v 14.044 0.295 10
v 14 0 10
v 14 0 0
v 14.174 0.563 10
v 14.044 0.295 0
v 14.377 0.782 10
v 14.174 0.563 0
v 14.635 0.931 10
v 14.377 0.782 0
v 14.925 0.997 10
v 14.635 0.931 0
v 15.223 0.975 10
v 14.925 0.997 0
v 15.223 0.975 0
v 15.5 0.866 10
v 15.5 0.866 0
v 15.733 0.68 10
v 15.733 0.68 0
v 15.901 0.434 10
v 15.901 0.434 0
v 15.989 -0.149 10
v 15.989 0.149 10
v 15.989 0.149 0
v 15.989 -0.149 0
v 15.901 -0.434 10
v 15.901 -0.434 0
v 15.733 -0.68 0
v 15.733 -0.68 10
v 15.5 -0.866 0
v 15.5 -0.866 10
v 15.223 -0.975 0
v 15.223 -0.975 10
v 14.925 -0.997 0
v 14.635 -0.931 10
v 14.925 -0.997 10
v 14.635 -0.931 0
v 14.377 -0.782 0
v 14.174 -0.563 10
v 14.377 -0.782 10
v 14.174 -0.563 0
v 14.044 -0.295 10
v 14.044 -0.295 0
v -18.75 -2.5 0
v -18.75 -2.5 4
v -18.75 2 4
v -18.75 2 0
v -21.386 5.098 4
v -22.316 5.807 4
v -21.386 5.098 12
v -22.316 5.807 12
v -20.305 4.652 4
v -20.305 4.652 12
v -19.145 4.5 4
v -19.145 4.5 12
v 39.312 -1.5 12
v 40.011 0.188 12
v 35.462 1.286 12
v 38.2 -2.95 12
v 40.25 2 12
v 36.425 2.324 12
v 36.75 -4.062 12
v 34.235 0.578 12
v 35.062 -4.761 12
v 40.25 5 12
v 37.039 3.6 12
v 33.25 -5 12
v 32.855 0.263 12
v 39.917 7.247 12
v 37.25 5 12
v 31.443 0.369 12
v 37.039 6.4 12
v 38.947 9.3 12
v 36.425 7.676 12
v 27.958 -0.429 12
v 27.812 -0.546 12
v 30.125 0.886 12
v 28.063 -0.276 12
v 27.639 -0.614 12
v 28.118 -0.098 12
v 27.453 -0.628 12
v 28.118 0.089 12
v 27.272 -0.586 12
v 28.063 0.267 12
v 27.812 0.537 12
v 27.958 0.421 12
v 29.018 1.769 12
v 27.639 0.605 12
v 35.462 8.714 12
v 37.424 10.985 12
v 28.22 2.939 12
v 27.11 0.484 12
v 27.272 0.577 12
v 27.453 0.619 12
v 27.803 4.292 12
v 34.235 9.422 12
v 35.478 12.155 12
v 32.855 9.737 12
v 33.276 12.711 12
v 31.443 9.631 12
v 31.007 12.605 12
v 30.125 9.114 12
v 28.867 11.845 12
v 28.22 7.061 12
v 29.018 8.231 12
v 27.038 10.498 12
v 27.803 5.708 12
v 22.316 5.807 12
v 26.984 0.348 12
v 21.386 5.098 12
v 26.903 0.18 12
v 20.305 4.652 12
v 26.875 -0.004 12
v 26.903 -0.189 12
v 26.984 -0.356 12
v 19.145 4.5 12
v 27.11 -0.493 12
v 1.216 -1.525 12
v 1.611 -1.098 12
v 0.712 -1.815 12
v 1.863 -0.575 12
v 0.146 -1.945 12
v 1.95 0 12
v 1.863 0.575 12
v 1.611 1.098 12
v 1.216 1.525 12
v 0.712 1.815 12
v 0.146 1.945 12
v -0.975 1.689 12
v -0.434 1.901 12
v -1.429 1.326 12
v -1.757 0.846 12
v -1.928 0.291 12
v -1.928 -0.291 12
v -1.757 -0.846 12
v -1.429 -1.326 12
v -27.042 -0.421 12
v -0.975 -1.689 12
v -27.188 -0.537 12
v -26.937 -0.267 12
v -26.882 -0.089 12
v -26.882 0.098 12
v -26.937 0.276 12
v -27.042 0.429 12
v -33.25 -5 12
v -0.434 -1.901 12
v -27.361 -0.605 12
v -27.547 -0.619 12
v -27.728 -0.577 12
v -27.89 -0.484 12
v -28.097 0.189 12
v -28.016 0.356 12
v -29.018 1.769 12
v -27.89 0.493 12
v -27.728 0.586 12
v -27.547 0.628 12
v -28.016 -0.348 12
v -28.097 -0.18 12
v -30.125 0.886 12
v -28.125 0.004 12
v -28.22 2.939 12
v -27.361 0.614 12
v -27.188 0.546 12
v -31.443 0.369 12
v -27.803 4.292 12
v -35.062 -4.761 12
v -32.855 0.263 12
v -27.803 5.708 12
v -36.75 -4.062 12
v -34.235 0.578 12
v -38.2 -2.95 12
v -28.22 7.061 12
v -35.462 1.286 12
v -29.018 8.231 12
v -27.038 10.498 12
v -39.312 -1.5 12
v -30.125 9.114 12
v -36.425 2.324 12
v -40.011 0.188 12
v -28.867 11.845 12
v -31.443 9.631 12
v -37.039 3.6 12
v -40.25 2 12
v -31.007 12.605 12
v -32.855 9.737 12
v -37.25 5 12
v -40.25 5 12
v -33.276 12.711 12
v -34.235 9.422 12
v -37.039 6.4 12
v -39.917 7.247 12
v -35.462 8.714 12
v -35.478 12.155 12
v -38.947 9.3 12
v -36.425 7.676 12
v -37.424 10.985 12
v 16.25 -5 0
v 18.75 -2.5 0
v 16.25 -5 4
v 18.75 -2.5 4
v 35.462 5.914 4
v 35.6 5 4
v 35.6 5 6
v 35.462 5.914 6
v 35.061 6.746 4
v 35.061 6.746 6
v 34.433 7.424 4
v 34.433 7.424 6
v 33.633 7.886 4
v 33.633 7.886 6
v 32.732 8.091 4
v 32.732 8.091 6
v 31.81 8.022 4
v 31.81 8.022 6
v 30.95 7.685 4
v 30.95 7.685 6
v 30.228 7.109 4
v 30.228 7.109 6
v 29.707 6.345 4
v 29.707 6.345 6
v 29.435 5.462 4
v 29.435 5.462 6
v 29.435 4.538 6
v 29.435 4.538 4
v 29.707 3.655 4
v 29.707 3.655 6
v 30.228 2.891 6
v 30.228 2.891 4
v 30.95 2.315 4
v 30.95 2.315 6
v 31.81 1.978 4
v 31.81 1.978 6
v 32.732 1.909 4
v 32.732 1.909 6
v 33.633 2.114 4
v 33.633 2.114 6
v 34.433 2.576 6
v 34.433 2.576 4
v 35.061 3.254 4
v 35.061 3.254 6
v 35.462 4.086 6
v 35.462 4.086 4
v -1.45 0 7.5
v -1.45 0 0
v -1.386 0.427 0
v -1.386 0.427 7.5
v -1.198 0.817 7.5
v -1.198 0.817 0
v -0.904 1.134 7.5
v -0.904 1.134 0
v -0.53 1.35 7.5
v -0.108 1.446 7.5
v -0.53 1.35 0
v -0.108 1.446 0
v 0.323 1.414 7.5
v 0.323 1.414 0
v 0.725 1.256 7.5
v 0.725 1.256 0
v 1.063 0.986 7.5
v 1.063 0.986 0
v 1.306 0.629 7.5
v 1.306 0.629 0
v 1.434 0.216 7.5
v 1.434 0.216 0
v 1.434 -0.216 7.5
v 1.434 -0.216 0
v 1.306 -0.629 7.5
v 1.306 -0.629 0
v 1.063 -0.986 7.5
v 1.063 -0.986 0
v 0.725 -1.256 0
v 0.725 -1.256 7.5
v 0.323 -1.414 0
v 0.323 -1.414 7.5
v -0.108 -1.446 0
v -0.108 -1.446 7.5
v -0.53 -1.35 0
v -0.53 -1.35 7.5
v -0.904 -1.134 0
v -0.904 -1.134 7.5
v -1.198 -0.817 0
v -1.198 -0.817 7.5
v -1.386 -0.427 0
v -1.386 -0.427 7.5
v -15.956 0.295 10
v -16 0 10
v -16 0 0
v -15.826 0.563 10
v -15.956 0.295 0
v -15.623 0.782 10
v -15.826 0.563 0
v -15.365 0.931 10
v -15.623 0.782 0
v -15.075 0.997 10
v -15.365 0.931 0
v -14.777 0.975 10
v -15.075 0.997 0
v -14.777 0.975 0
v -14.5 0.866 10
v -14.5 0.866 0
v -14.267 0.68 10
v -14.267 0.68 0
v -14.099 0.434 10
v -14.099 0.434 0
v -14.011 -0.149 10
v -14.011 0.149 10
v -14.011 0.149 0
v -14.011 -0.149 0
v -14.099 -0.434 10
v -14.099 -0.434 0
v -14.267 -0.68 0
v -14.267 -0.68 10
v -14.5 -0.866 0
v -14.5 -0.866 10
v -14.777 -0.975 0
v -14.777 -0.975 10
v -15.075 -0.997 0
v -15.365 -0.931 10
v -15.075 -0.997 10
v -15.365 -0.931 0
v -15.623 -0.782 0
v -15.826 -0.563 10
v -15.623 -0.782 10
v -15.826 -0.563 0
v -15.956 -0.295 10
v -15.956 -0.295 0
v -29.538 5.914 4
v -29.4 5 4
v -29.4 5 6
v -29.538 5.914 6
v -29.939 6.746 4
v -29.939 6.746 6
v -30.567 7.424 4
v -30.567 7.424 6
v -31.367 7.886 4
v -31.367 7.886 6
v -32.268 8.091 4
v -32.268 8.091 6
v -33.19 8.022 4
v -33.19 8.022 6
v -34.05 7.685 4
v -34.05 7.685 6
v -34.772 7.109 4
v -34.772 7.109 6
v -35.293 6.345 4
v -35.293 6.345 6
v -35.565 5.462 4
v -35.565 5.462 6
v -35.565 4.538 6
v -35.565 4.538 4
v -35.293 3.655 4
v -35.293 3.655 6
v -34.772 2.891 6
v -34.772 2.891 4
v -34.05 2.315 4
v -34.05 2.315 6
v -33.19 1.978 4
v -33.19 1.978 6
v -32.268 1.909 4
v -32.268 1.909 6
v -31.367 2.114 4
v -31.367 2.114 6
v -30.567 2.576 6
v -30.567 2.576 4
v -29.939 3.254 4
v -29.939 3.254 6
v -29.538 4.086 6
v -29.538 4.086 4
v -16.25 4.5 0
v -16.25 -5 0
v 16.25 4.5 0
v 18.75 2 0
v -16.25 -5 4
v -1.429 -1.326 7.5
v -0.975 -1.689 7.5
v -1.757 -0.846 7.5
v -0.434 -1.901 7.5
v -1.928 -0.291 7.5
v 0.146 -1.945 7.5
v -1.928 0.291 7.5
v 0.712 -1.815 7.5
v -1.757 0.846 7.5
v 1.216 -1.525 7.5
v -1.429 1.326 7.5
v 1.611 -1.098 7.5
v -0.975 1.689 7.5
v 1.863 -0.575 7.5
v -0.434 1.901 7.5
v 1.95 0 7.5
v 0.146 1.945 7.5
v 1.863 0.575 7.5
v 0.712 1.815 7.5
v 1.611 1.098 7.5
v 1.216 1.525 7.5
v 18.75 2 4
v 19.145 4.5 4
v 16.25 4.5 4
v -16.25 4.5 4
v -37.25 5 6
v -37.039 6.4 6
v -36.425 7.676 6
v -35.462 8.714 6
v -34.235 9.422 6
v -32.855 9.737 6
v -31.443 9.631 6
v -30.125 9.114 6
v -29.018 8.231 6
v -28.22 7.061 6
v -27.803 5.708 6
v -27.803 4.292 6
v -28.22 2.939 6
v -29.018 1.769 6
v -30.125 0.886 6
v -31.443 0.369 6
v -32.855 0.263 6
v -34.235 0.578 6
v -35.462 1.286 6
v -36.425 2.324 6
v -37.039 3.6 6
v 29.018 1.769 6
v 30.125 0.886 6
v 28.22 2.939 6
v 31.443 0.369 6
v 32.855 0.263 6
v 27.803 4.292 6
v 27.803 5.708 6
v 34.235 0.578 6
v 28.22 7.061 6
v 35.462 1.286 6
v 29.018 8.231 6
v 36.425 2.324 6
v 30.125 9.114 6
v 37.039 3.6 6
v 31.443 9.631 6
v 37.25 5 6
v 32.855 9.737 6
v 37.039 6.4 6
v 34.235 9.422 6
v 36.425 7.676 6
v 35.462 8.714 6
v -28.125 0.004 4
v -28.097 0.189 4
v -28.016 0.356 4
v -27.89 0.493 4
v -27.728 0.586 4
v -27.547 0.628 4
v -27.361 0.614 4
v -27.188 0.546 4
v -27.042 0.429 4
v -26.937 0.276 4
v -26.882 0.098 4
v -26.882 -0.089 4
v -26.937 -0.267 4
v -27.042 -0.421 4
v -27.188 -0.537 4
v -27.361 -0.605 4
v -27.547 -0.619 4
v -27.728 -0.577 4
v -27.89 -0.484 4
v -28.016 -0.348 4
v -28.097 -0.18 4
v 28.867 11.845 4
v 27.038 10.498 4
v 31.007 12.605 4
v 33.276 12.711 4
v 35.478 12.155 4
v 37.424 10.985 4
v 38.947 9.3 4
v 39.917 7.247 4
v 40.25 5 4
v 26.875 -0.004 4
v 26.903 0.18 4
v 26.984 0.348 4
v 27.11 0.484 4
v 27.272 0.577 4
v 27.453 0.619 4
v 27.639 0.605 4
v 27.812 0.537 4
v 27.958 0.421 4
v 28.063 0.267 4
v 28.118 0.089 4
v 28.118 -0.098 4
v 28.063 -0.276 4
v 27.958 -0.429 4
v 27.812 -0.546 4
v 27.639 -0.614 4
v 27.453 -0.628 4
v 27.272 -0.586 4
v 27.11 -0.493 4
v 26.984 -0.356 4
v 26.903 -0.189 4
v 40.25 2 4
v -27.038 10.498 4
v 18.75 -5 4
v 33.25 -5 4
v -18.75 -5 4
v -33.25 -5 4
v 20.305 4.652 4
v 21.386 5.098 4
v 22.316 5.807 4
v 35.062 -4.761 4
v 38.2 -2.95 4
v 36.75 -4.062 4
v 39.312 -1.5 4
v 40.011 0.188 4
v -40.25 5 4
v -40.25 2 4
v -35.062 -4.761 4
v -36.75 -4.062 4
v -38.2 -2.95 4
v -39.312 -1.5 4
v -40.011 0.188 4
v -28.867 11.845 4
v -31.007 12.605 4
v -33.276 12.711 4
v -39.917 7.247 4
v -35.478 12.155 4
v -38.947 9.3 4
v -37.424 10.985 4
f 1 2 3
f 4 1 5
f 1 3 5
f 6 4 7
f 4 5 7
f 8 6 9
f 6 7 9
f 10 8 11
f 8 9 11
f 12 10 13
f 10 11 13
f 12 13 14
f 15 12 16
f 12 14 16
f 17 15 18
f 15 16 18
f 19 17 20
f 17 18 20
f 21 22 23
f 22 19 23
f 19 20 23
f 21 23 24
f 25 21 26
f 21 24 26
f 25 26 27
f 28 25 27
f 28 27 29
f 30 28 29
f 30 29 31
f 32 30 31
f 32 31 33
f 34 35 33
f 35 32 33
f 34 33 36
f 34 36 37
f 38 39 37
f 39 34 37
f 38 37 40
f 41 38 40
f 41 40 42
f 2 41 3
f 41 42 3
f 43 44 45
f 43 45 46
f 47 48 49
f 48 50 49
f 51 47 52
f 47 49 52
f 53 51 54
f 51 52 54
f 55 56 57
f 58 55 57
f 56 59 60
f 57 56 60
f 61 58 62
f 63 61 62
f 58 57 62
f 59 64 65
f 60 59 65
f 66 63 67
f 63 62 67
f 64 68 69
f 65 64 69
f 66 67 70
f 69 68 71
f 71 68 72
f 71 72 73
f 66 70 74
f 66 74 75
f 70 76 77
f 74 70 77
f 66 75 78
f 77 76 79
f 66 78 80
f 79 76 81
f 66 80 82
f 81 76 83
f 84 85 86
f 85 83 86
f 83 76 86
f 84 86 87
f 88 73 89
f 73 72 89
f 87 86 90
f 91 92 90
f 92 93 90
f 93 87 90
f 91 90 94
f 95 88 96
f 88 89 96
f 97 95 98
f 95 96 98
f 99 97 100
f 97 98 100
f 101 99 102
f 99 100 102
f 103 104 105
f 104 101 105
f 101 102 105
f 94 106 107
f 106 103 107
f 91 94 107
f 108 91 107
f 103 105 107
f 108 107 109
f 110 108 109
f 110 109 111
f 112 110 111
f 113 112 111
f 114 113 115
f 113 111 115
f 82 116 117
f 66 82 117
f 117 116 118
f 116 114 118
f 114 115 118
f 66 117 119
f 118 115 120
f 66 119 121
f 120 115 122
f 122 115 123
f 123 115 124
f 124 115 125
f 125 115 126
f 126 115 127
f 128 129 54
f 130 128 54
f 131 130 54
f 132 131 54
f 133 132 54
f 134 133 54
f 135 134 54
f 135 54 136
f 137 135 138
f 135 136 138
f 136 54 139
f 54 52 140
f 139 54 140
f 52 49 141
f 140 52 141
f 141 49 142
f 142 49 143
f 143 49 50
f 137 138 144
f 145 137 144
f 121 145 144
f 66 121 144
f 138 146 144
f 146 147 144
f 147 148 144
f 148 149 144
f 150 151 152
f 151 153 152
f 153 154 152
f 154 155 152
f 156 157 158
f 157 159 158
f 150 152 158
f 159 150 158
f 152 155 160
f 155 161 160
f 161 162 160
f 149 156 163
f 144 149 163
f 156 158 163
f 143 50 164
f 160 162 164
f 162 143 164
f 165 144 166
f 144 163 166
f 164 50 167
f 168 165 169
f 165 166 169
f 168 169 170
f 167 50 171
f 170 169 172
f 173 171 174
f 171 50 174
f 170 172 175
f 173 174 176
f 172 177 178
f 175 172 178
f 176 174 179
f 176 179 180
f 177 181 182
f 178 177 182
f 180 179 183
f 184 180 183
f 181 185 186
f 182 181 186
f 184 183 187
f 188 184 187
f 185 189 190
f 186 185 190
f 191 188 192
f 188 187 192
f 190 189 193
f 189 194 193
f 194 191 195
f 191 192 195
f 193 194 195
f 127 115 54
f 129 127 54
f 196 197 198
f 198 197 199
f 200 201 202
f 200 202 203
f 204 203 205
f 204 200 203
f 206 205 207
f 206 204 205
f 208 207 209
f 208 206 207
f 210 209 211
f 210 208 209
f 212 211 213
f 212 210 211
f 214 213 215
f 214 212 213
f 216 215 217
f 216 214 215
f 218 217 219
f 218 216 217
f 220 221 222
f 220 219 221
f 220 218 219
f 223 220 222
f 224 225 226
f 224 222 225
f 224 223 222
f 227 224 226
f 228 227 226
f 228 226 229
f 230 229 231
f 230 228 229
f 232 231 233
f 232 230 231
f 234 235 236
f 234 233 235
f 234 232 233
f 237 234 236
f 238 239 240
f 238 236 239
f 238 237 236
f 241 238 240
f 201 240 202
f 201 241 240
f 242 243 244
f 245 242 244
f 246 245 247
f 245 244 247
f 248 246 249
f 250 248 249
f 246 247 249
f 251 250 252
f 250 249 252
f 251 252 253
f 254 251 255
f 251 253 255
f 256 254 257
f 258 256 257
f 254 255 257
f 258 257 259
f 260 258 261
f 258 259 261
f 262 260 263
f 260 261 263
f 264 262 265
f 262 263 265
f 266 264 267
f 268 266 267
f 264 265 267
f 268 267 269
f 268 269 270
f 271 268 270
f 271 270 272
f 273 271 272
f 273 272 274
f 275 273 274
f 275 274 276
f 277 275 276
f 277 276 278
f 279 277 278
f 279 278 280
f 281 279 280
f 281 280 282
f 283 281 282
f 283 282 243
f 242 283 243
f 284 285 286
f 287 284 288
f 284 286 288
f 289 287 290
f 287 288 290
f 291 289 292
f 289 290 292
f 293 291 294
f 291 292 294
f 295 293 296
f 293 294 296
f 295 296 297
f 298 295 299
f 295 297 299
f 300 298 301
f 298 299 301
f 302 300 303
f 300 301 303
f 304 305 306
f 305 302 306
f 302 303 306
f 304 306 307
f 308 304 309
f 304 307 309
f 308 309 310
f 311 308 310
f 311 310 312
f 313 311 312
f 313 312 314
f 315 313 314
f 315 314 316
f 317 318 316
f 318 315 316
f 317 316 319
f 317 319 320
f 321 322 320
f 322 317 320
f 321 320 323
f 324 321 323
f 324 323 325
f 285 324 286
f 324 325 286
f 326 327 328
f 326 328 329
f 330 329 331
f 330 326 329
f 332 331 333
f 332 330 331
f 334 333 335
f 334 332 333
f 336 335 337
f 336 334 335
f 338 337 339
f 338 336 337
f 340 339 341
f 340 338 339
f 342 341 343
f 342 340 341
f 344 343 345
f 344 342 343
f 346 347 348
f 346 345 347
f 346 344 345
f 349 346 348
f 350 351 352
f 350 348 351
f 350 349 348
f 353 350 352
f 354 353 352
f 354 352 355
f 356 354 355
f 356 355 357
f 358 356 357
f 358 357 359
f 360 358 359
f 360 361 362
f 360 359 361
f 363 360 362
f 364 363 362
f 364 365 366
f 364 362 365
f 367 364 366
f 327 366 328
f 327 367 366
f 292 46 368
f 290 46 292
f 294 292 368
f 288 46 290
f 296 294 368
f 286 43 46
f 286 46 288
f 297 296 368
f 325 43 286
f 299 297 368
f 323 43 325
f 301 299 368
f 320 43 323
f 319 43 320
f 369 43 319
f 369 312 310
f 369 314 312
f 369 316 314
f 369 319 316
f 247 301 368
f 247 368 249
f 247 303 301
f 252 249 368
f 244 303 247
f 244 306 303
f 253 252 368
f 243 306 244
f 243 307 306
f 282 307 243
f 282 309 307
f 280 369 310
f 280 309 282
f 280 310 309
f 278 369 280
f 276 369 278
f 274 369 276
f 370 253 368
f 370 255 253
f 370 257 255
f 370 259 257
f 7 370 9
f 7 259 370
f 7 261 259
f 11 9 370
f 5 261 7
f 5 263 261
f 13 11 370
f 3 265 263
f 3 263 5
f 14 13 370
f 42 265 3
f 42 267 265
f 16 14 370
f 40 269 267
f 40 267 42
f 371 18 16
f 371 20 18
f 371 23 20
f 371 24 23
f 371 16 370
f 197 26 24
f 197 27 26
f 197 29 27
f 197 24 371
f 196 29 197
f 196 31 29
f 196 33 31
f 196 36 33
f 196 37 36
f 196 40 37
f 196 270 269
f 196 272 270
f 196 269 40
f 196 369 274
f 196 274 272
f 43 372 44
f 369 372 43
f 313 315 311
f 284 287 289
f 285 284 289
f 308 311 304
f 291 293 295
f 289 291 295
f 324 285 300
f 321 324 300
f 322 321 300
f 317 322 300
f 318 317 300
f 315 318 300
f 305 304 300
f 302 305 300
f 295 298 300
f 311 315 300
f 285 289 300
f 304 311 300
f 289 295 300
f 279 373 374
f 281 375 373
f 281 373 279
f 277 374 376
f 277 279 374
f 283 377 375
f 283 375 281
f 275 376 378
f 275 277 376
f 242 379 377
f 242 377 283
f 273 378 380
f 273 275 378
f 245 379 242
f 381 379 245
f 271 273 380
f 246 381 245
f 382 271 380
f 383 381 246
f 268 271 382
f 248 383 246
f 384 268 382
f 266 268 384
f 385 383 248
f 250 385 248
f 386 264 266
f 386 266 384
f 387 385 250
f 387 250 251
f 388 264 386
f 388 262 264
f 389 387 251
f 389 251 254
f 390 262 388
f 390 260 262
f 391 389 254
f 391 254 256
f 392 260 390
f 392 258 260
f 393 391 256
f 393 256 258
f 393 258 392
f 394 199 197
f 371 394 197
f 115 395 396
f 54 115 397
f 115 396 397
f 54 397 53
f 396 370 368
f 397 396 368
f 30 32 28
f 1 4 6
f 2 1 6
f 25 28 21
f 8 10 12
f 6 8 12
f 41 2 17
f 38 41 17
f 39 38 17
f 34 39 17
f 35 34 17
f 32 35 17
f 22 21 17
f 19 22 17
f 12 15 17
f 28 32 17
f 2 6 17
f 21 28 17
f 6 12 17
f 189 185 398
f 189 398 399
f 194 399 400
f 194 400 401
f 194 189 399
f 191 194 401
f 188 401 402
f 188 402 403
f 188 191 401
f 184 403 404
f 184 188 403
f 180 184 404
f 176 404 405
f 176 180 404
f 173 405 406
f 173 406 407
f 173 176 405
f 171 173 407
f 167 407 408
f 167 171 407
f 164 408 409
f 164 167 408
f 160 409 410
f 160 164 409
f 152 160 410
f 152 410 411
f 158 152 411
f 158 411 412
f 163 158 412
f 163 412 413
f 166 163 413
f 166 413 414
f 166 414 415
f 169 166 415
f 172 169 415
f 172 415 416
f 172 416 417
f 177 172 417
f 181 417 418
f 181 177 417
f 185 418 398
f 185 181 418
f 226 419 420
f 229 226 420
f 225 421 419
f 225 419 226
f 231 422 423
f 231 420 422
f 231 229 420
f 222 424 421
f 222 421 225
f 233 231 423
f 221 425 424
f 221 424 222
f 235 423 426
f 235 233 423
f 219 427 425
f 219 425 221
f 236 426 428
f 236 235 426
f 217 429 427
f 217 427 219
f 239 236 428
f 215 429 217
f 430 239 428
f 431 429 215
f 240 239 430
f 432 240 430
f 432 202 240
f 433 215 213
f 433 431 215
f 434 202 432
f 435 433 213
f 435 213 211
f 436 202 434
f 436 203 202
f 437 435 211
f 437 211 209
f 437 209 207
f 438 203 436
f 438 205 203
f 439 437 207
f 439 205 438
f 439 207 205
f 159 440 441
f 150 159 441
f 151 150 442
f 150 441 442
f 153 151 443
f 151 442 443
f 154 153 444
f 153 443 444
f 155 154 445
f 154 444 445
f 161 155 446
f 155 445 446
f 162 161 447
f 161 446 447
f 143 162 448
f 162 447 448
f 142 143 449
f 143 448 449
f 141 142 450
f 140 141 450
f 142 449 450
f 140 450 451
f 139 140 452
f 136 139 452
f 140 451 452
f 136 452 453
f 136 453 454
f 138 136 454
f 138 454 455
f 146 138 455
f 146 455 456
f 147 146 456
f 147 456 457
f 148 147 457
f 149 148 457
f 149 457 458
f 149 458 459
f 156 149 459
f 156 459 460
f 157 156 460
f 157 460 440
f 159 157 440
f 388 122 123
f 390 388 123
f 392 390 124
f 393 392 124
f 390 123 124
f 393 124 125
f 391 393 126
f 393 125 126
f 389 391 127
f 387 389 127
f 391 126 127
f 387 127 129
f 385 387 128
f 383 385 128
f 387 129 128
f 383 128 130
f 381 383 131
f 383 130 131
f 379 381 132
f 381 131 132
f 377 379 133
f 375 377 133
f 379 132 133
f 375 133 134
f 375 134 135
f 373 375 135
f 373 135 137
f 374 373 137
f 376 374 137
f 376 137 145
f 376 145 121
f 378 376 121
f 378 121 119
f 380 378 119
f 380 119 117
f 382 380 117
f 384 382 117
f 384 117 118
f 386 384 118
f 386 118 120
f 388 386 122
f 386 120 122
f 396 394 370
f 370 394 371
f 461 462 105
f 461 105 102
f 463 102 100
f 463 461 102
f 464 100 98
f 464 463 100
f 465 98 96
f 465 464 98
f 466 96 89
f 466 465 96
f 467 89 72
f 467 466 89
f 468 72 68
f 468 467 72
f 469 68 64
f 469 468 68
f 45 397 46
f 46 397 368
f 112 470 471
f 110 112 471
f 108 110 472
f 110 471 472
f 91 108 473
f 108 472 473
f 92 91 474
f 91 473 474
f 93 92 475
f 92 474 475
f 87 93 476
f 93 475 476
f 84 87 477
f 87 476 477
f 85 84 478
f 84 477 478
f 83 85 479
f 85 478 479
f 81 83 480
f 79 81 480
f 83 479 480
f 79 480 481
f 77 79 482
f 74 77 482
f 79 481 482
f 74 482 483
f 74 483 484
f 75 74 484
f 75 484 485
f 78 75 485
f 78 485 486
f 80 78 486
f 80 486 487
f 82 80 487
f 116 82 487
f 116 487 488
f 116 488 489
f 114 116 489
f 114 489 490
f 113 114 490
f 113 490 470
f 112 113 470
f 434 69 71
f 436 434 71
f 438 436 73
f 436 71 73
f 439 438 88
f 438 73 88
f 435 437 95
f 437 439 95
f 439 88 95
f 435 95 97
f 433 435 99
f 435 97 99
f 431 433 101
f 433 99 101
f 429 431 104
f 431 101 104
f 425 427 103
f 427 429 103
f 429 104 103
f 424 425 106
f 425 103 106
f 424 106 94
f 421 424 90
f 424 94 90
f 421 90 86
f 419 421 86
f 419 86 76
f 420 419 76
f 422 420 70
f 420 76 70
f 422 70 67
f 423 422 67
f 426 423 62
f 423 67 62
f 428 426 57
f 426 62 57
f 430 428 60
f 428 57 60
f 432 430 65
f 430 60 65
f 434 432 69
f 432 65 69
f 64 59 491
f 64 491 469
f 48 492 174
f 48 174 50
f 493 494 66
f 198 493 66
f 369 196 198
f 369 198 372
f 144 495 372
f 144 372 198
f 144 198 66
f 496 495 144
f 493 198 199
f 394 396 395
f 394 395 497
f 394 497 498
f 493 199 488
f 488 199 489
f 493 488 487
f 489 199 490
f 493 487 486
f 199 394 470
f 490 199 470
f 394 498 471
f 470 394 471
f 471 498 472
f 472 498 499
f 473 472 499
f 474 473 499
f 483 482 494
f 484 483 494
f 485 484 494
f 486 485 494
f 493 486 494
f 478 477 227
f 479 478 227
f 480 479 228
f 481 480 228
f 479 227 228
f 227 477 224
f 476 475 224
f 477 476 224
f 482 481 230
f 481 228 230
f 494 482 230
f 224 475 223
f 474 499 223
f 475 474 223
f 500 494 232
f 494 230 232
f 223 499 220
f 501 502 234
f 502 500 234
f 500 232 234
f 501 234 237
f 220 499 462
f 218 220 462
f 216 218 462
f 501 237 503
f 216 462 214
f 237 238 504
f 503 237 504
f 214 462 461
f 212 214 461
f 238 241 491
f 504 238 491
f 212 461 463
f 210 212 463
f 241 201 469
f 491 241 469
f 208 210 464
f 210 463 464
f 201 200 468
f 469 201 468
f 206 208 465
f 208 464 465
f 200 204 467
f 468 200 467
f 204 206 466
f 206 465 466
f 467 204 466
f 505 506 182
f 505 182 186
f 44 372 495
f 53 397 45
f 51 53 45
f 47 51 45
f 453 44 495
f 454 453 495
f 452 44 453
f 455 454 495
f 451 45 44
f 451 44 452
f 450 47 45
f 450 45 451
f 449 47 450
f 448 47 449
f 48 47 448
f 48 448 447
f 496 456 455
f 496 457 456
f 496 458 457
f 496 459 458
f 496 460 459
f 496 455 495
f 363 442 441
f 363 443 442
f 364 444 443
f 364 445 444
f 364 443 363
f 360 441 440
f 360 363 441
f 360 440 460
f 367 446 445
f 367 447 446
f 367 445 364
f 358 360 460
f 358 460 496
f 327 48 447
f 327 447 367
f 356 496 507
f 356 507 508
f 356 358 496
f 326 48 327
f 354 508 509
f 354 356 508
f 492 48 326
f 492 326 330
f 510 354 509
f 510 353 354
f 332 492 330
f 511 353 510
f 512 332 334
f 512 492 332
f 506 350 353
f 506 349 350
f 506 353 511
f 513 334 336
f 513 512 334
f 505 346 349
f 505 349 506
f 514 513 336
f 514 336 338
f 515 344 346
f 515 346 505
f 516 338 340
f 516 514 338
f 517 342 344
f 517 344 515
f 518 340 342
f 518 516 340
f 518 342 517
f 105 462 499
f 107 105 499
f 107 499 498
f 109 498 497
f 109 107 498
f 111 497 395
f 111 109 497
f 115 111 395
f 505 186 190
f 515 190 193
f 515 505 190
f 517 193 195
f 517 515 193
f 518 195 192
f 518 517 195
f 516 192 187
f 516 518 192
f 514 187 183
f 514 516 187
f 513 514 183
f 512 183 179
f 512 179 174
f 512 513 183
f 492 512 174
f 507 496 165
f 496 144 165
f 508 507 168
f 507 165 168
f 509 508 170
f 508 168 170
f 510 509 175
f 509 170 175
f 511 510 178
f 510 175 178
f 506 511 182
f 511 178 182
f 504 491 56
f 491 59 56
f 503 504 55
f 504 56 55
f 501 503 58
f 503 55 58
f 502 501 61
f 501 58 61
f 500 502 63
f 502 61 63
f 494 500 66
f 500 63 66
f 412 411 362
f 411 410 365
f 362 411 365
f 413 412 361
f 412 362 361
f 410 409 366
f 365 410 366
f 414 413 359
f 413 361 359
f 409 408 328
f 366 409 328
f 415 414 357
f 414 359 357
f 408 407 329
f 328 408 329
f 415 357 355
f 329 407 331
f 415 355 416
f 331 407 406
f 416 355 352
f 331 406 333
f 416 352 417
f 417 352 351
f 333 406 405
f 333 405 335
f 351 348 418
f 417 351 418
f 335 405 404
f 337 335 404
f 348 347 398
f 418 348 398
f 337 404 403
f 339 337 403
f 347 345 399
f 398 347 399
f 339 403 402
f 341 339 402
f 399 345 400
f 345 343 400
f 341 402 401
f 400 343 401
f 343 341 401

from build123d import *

# Parameters (mm, degrees)
SKETCH1_W                     = 78.5
SKETCH1_H                     = 7
BOSS_EXTRUDE1_DEPTH           = 12
BOSS_EXTRUDE1_DEPTH_BACK      = 12
SKETCH2_W                     = 20.5
SKETCH2_H                     = 6.3
CUT_EXTRUDE1_DEPTH            = 8
SKETCH3_W                     = 13.5
SKETCH3_H                     = 8.85
BOSS_EXTRUDE2_DEPTH           = 8
SKETCH4_R                     = 3.1
CUT_EXTRUDE2_DEPTH            = 22
CUT_EXTRUDE2_DEPTH_BACK       = 24.5
CUT_EXTRUDE3_DEPTH            = 5
SKETCH6_R                     = 6.2
CUT_EXTRUDE4_DEPTH            = 1
MIRROR2_COPY_1_SKETCH_R       = 6.2
MIRROR2_COPY_1_DEPTH          = 1
SKETCH7_W                     = 13.5
SKETCH7_H                     = 8.5
CUT_EXTRUDE5_DEPTH            = 1
MIRROR5_COPY_1_SKETCH_W       = 13.5
MIRROR5_COPY_1_SKETCH_H       = 8.5
MIRROR5_COPY_1_DEPTH          = 1
TAP_DRILL_FOR_M2_TAP1_D       = 1.6
CUT_EXTRUDE6_DEPTH            = 27
SKETCH12_W                    = 91.032241704
SKETCH12_H                    = 44.33734078
CUT_EXTRUDE7_DEPTH            = 22
F_2_0_2_DIAMETER_HOLE2_D      = 2
F_2_0_2_DIAMETER_HOLE2_DEPTH  = 16
F_2_0_2_DIAMETER_HOLE2_TIP    = 0.600860619
F_2_0_2_DIAMETER_HOLE1_D      = 2
F_2_0_2_DIAMETER_HOLE1_DEPTH  = 16
F_2_0_2_DIAMETER_HOLE1_TIP    = 0.600860619
ESQUISSE5_R                   = 3.1
BOSS_EXTRU_1_DEPTH            = 1
ESQUISSE6_R                   = 4.75
ENL_V_MAT_EXTRU_1_DEPTH       = 6
ESQUISSE7_R                   = 0.8
BOSS_EXTRU_2_DEPTH            = 8.85
BOSS_EXTRUDE3_DEPTH           = 1.5
SKETCH24_W                    = 22.483380367
SKETCH24_H                    = 20.071516443
CUT_EXTRUDE8_DEPTH            = 0.85
BOSS_EXTRUDE4_DEPTH           = 8
M2_5_CLEARANCE_HOLE1_D        = 2.9
M2_5_CLEARANCE_HOLE1_DEPTH    = 24
M2_5_CLEARANCE_HOLE1_TIP      = 0.871247898
SKETCH26_W                    = 37.5
SKETCH26_H                    = 12
BOSS_EXTRUDE6_DEPTH           = 1
SKETCH27_R                    = 1.95
CUT_EXTRUDE9_DEPTH            = 4.5
CHAMFER2_SIZE                 = 2.5
CUT_EXTRUDE10_DEPTH           = 10
ESQUISSE9_R                   = 0.6
ENL_V_MAT_EXTRU_2_DEPTH       = 13
SKETCH33_R                    = 7.75
SKETCH33_R_2                  = 4.75
BOSS_EXTRUDE9_DEPTH           = 8
SKETCH35_R                    = 1
BOSS_EXTRUDE10_DEPTH          = 2
BOSS_EXTRUDE11_DEPTH          = 8
FILLET2_R                     = 4.5
TAP_DRILL_FOR_M1_6_TAP1_D     = 1.25
TAP_DRILL_FOR_M1_6_TAP1_DEPTH = 24
TAP_DRILL_FOR_M1_6_TAP1_TIP   = 0.375537887
SKETCH40_W                    = 1
SKETCH40_H                    = 10
BOSS_EXTRUDE12_DEPTH          = 8
FILLET3_R                     = 7
SKETCH41_R                    = 0.582442918
BOSS_EXTRUDE13_DEPTH          = 8


with BuildPart() as part:
    # Sketch1 → Boss-Extrude1 (new body, two sides)
    with BuildSketch(Plane.XY) as boss_extrude1_sk:
        Rectangle(SKETCH1_W, SKETCH1_H)
    extrude(amount=BOSS_EXTRUDE1_DEPTH)
    extrude(boss_extrude1_sk.sketch, amount=-BOSS_EXTRUDE1_DEPTH_BACK)

    # Sketch2 → Cut-Extrude1 (cut, through all)
    with BuildSketch(Plane(origin=(0, 3.5, 0), x_dir=(1, 0, 0), z_dir=(0, 1, 0))):
        with Locations((-29, 0)):
            Rectangle(SKETCH2_W, SKETCH2_H)
        with Locations((29, 0)):
            Rectangle(SKETCH2_W, SKETCH2_H)
    extrude(amount=-CUT_EXTRUDE1_DEPTH, mode=Mode.SUBTRACT)

    # Sketch3 → Boss-Extrude2 (add)
    with BuildSketch(Plane(origin=(0, 3.5, 0), x_dir=(1, 0, 0), z_dir=(0, 1, 0))):
        with Locations((-32.5, 7.575)):
            Rectangle(SKETCH3_W, SKETCH3_H)
        with Locations((-32.5, -7.575)):
            Rectangle(SKETCH3_W, SKETCH3_H)
        with Locations((32.5, -7.575)):
            Rectangle(SKETCH3_W, SKETCH3_H)
        with Locations((32.5, 7.575)):
            Rectangle(SKETCH3_W, SKETCH3_H)
    extrude(amount=BOSS_EXTRUDE2_DEPTH)

    # Sketch4 → Cut-Extrude2 (cut, two sides)
    with BuildSketch(Plane.XY) as cut_extrude2_sk:
        with Locations((-32.5, 5)):
            Circle(SKETCH4_R)
        with Locations((32.5, 5)):
            Circle(SKETCH4_R)
    extrude(amount=CUT_EXTRUDE2_DEPTH, mode=Mode.SUBTRACT)
    extrude(cut_extrude2_sk.sketch, amount=-CUT_EXTRUDE2_DEPTH_BACK, mode=Mode.SUBTRACT)

    # Sketch5 → Cut-Extrude3 (cut)
    with BuildSketch(Plane.XY):
        Polygon((15, 3.5), (36.256888292, -2.195766051), (36.256888292, 11.5), (15, 11.5), align=None)
    extrude(amount=-CUT_EXTRUDE3_DEPTH, mode=Mode.SUBTRACT)

    # Sketch6 → Cut-Extrude4 (cut)
    with BuildSketch(Plane.XY.offset(12)):
        with Locations((32.5, 5)):
            Circle(SKETCH6_R)
    cut_extrude4 = extrude(amount=-CUT_EXTRUDE4_DEPTH, mode=Mode.SUBTRACT)

    # Mirror1: Cut-Extrude4 across plane
    add(cut_extrude4.mirror(Plane.XY), mode=Mode.SUBTRACT)

    # Mirror2: Cut-Extrude4 across plane
    add(cut_extrude4.mirror(Plane(origin=(0, 0, 0), x_dir=(0, 0, 1), z_dir=(1, 0, 0))), mode=Mode.SUBTRACT)

    # Mirror2 copy 1 sketch → Mirror2 copy 1 (cut)
    with BuildSketch(Plane(origin=(0, 0, -12), x_dir=(-1, 0, 0), z_dir=(0, 0, -1))):
        with Locations((32.5, 5)):
            Circle(MIRROR2_COPY_1_SKETCH_R)
    extrude(amount=-MIRROR2_COPY_1_DEPTH, mode=Mode.SUBTRACT)

    # Sketch7 → Cut-Extrude5 (cut)
    with BuildSketch(Plane.XY.offset(12)):
        with Locations((-32.5, 7.25)):
            Rectangle(SKETCH7_W, SKETCH7_H)
    cut_extrude5 = extrude(amount=-CUT_EXTRUDE5_DEPTH, mode=Mode.SUBTRACT)

    # Mirror3: Cut-Extrude5 across plane
    add(cut_extrude5.mirror(Plane(origin=(0, 0, 0), x_dir=(0, 0, 1), z_dir=(1, 0, 0))), mode=Mode.SUBTRACT)

    # Mirror5: Cut-Extrude5 across plane
    add(cut_extrude5.mirror(Plane.XY), mode=Mode.SUBTRACT)

    # Mirror5 copy 1 sketch → Mirror5 copy 1 (cut)
    with BuildSketch(Plane(origin=(0, 0, -12), x_dir=(-1, 0, 0), z_dir=(0, 0, -1))):
        with Locations((-32.5, 7.25)):
            Rectangle(MIRROR5_COPY_1_SKETCH_W, MIRROR5_COPY_1_SKETCH_H)
    extrude(amount=-MIRROR5_COPY_1_DEPTH, mode=Mode.SUBTRACT)

    # Tap Drill for M2 Tap1 (through all)
    with Locations(Plane.XY.offset(12)):
        with Locations((-25, 0), (0, 0), (25, 0)):
            Hole(TAP_DRILL_FOR_M2_TAP1_D / 2)

    # Sketch11 → Cut-Extrude6 (cut)
    with BuildSketch(Plane.XY.offset(12)):
        with BuildLine():
            Line((-39.25, 5), (-39.25, 21.221242017))
            Line((-39.25, 21.221242017), (-25.75, 21.221242017))
            Line((-25.75, 21.221242017), (-25.75, 5))
            ThreePointArc((-25.75, 5), (-32.5, 11.75), (-39.25, 5))
        make_face()
    extrude(amount=-CUT_EXTRUDE6_DEPTH, mode=Mode.SUBTRACT)

    # Sketch12 → Cut-Extrude7 (cut)
    with BuildSketch(Plane.XY):
        Rectangle(SKETCH12_W, SKETCH12_H)
    extrude(amount=-CUT_EXTRUDE7_DEPTH, mode=Mode.SUBTRACT)

    # 2.0 _2_ Diameter Hole2
    with Locations(Plane.XY.offset(12)):
        with Locations((-15, 0)):
            Hole(F_2_0_2_DIAMETER_HOLE2_D / 2, depth=F_2_0_2_DIAMETER_HOLE2_DEPTH)
            with Locations((0, 0, -(F_2_0_2_DIAMETER_HOLE2_DEPTH + F_2_0_2_DIAMETER_HOLE2_TIP / 2))):  # 118° drill point
                Cone(0, F_2_0_2_DIAMETER_HOLE2_D / 2, F_2_0_2_DIAMETER_HOLE2_TIP, mode=Mode.SUBTRACT)

    # 2.0 _2_ Diameter Hole1
    with Locations(Plane.XY.offset(12)):
        with Locations((15, 0)):
            Hole(F_2_0_2_DIAMETER_HOLE1_D / 2, depth=F_2_0_2_DIAMETER_HOLE1_DEPTH)
            with Locations((0, 0, -(F_2_0_2_DIAMETER_HOLE1_DEPTH + F_2_0_2_DIAMETER_HOLE1_TIP / 2))):  # 118° drill point
                Cone(0, F_2_0_2_DIAMETER_HOLE1_D / 2, F_2_0_2_DIAMETER_HOLE1_TIP, mode=Mode.SUBTRACT)

    # Esquisse5 → Boss.-Extru.1 (add)
    with BuildSketch(Plane.XY.offset(11)):
        with BuildLine():
            Line((25.75, 3), (26.6314397, 3))
            ThreePointArc((26.6314397, 3), (32.5, -1.2), (38.3685603, 3))
            Line((38.3685603, 3), (39.25, 3))
            Line((39.25, 3), (39.25, 11.5))
            Line((39.25, 11.5), (25.75, 11.5))
            Line((25.75, 11.5), (25.75, 3))
        make_face()
        with Locations((32.5, 5)):
            Circle(ESQUISSE5_R, mode=Mode.SUBTRACT)
    boss_extru_1 = extrude(amount=BOSS_EXTRU_1_DEPTH)

    # Esquisse6 → Enl_v. mat.-Extru.1 (cut)
    with BuildSketch(Plane.XY.offset(12)):
        with Locations((32.5, 5)):
            Circle(ESQUISSE6_R)
    enl_v_mat_extru_1 = extrude(amount=-ENL_V_MAT_EXTRU_1_DEPTH, mode=Mode.SUBTRACT)

    # Sym_trie1: Boss.-Extru.1, Enl_v. mat.-Extru.1 across plane
    add(boss_extru_1.mirror(Plane(origin=(0, 0, 0), x_dir=(0, 0, 1), z_dir=(1, 0, 0))))
    add(enl_v_mat_extru_1.mirror(Plane(origin=(0, 0, 0), x_dir=(0, 0, 1), z_dir=(1, 0, 0))), mode=Mode.SUBTRACT)

    # Esquisse7 → Boss.-Extru.2 (add)
    with BuildSketch(Plane.XY.offset(12)):
        with Locations((-25, 0)):
            Circle(ESQUISSE7_R)
        with Locations((25, 0)):
            Circle(ESQUISSE7_R)
    extrude(amount=-BOSS_EXTRU_2_DEPTH)

    # Sketch18 → Boss-Extrude3 (add)
    with BuildSketch(Plane.XZ.offset(3.5)):
        Polygon((-18.75, 0), (18.75, 0), (18.75, 3.15), (39.25, 3.15), (39.25, 12), (-39.25, 12), (-39.25, 3.15), (-18.75, 3.15), align=None)
    extrude(amount=BOSS_EXTRUDE3_DEPTH)

    # Sketch24 → Cut-Extrude8 (cut)
    with BuildSketch(Plane(origin=(0, 0, 3.15), x_dir=(-1, 0, 0), z_dir=(0, 0, -1))):
        with Locations((-29.991690184, 5.035758222)):
            Rectangle(SKETCH24_W, SKETCH24_H)
        with Locations((29.991690184, 5.035758222)):
            Rectangle(SKETCH24_W, SKETCH24_H)
    extrude(amount=-CUT_EXTRUDE8_DEPTH, mode=Mode.SUBTRACT)

    # Sketch19 → Boss-Extrude4 (add)
    with BuildSketch(Plane(origin=(0, 0, 4), x_dir=(-1, 0, 0), z_dir=(0, 0, -1))):
        Polygon((27.894392089, 9.934660654), (21, 3.5), (25.75, 3.5), align=None)
        Polygon((-25.75, 3.5), (-21, 3.5), (-27.894392089, 9.934660654), align=None)
    extrude(amount=-BOSS_EXTRUDE4_DEPTH)

    # M2.5 Clearance Hole1
    with Locations(Plane.XY.offset(12)):
        with Locations((0, 0)):
            Hole(M2_5_CLEARANCE_HOLE1_D / 2, depth=M2_5_CLEARANCE_HOLE1_DEPTH)
            with Locations((0, 0, -(M2_5_CLEARANCE_HOLE1_DEPTH + M2_5_CLEARANCE_HOLE1_TIP / 2))):  # 118° drill point
                Cone(0, M2_5_CLEARANCE_HOLE1_D / 2, M2_5_CLEARANCE_HOLE1_TIP, mode=Mode.SUBTRACT)

    # Sketch26 → Boss-Extrude6 (add)
    with BuildSketch(Plane(origin=(0, 3.5, 0), x_dir=(1, 0, 0), z_dir=(0, 1, 0))):
        with Locations((0, -6)):
            Rectangle(SKETCH26_W, SKETCH26_H)
    extrude(amount=BOSS_EXTRUDE6_DEPTH)

    # Sketch27 → Cut-Extrude9 (cut)
    with BuildSketch(Plane.XY.offset(12)):
        Circle(SKETCH27_R)
    extrude(amount=-CUT_EXTRUDE9_DEPTH, mode=Mode.SUBTRACT)

    # Chamfer2
    chamfer2_edges = [part.edges().sort_by_distance(p)[0] for p in [
        (18.75, 4.5, 6),
        (-18.75, 4.5, 6),
        (-18.75, -5, 2),
        (18.75, -5, 2),
    ]]
    chamfer(chamfer2_edges, length=CHAMFER2_SIZE)

    # Sketch32 → Cut-Extrude10 (cut)
    with BuildSketch(Plane(origin=(0, 0, 4), x_dir=(-1, 0, 0), z_dir=(0, 0, -1))):
        Polygon((24.736961251, 6.987773428), (32.5, 11.5), (37.878089133, 9.079051027), (39.25, 5), (41.051218968, 5), (41.051218968, 13.570990907), (25.598047204, 20.527242354), align=None)
        Polygon((-25.75, 7.933260788), (-32.5, 11.5), (-39.25, 7.747740561), (-44.98837862, 11.787792939), (-32.95842996, 17.943701699), (-19.091373489, 11.787792939), align=None)
    extrude(amount=-CUT_EXTRUDE10_DEPTH, mode=Mode.SUBTRACT)

    # Esquisse9 → Enl_v. mat.-Extru.2 (cut, through all)
    with BuildSketch(Plane.XY.offset(12)):
        with Locations((27.5, 0)):
            Circle(ESQUISSE9_R)
        with Locations((-27.5, 0)):
            Circle(ESQUISSE9_R)
    extrude(amount=-ENL_V_MAT_EXTRU_2_DEPTH, mode=Mode.SUBTRACT)

    # Sketch33 → Boss-Extrude9 (add)
    with BuildSketch(Plane(origin=(0, 0, 4), x_dir=(-1, 0, 0), z_dir=(0, 0, -1))):
        with Locations((32.5, 5)):
            Circle(SKETCH33_R)
        with Locations((32.5, 5)):
            Circle(SKETCH33_R_2, mode=Mode.SUBTRACT)
        with Locations((-32.5, 5)):
            Circle(SKETCH33_R)
        with Locations((-32.5, 5)):
            Circle(SKETCH33_R_2, mode=Mode.SUBTRACT)
    extrude(amount=-BOSS_EXTRUDE9_DEPTH)

    # Sketch35 → Boss-Extrude10 (add)
    with BuildSketch(Plane.XY.offset(12)):
        with Locations((-15, 0)):
            Circle(SKETCH35_R)
        with Locations((15, 0)):
            Circle(SKETCH35_R)
    extrude(amount=-BOSS_EXTRUDE10_DEPTH)

    # Sketch36 → Boss-Extrude11 (add)
    with BuildSketch(Plane(origin=(0, 0, 4), x_dir=(-1, 0, 0), z_dir=(0, 0, -1))):
        Polygon((-16.25, 4.5), (-18.75, -2.5), (-27.038121047, 10.49821592), (-21, 4.5), align=None)
        Polygon((18.75, -2.5), (27.038121047, 10.49821592), (21, 4.5), (16.25, 4.5), align=None)
    extrude(amount=-BOSS_EXTRUDE11_DEPTH)

    # Fillet2
    fillet2_edges = [part.edges().sort_by_distance(p)[0] for p in [
        (21, 4.5, 8),
        (-21, 4.5, 8),
    ]]
    fillet(fillet2_edges, radius=FILLET2_R)

    # Tap Drill for M1.6 Tap1
    with Locations(Plane.XY.offset(12)):
        with Locations((-27.500000533, 0.004370021), (27.499997993, -0.00437002)):
            Hole(TAP_DRILL_FOR_M1_6_TAP1_D / 2, depth=TAP_DRILL_FOR_M1_6_TAP1_DEPTH)
            with Locations((0, 0, -(TAP_DRILL_FOR_M1_6_TAP1_DEPTH + TAP_DRILL_FOR_M1_6_TAP1_TIP / 2))):  # 118° drill point
                Cone(0, TAP_DRILL_FOR_M1_6_TAP1_D / 2, TAP_DRILL_FOR_M1_6_TAP1_TIP, mode=Mode.SUBTRACT)

    # Sketch40 → Boss-Extrude12 (add)
    with BuildSketch(Plane(origin=(0, 0, 4), x_dir=(-1, 0, 0), z_dir=(0, 0, -1))):
        with Locations((39.75, 0)):
            Rectangle(SKETCH40_W, SKETCH40_H)
        with Locations((-39.75, 0)):
            Rectangle(SKETCH40_W, SKETCH40_H)
    extrude(amount=-BOSS_EXTRUDE12_DEPTH)

    # Fillet3
    fillet3_edges = [part.edges().sort_by_distance(p)[0] for p in [
        (-40.25, -5, 8),
        (40.25, -5, 8),
    ]]
    fillet(fillet3_edges, radius=FILLET3_R)

    # Sketch41 → Boss-Extrude13 (add)
    with BuildSketch(Plane(origin=(0, 0, 4), x_dir=(-1, 0, 0), z_dir=(0, 0, -1))):
        with Locations((-25.110595356, 7.336492886)):
            Circle(SKETCH41_R)
        with Locations((25.110595356, 7.336492886)):
            Circle(SKETCH41_R)
    extrude(amount=-BOSS_EXTRUDE13_DEPTH)


solid = part.part
